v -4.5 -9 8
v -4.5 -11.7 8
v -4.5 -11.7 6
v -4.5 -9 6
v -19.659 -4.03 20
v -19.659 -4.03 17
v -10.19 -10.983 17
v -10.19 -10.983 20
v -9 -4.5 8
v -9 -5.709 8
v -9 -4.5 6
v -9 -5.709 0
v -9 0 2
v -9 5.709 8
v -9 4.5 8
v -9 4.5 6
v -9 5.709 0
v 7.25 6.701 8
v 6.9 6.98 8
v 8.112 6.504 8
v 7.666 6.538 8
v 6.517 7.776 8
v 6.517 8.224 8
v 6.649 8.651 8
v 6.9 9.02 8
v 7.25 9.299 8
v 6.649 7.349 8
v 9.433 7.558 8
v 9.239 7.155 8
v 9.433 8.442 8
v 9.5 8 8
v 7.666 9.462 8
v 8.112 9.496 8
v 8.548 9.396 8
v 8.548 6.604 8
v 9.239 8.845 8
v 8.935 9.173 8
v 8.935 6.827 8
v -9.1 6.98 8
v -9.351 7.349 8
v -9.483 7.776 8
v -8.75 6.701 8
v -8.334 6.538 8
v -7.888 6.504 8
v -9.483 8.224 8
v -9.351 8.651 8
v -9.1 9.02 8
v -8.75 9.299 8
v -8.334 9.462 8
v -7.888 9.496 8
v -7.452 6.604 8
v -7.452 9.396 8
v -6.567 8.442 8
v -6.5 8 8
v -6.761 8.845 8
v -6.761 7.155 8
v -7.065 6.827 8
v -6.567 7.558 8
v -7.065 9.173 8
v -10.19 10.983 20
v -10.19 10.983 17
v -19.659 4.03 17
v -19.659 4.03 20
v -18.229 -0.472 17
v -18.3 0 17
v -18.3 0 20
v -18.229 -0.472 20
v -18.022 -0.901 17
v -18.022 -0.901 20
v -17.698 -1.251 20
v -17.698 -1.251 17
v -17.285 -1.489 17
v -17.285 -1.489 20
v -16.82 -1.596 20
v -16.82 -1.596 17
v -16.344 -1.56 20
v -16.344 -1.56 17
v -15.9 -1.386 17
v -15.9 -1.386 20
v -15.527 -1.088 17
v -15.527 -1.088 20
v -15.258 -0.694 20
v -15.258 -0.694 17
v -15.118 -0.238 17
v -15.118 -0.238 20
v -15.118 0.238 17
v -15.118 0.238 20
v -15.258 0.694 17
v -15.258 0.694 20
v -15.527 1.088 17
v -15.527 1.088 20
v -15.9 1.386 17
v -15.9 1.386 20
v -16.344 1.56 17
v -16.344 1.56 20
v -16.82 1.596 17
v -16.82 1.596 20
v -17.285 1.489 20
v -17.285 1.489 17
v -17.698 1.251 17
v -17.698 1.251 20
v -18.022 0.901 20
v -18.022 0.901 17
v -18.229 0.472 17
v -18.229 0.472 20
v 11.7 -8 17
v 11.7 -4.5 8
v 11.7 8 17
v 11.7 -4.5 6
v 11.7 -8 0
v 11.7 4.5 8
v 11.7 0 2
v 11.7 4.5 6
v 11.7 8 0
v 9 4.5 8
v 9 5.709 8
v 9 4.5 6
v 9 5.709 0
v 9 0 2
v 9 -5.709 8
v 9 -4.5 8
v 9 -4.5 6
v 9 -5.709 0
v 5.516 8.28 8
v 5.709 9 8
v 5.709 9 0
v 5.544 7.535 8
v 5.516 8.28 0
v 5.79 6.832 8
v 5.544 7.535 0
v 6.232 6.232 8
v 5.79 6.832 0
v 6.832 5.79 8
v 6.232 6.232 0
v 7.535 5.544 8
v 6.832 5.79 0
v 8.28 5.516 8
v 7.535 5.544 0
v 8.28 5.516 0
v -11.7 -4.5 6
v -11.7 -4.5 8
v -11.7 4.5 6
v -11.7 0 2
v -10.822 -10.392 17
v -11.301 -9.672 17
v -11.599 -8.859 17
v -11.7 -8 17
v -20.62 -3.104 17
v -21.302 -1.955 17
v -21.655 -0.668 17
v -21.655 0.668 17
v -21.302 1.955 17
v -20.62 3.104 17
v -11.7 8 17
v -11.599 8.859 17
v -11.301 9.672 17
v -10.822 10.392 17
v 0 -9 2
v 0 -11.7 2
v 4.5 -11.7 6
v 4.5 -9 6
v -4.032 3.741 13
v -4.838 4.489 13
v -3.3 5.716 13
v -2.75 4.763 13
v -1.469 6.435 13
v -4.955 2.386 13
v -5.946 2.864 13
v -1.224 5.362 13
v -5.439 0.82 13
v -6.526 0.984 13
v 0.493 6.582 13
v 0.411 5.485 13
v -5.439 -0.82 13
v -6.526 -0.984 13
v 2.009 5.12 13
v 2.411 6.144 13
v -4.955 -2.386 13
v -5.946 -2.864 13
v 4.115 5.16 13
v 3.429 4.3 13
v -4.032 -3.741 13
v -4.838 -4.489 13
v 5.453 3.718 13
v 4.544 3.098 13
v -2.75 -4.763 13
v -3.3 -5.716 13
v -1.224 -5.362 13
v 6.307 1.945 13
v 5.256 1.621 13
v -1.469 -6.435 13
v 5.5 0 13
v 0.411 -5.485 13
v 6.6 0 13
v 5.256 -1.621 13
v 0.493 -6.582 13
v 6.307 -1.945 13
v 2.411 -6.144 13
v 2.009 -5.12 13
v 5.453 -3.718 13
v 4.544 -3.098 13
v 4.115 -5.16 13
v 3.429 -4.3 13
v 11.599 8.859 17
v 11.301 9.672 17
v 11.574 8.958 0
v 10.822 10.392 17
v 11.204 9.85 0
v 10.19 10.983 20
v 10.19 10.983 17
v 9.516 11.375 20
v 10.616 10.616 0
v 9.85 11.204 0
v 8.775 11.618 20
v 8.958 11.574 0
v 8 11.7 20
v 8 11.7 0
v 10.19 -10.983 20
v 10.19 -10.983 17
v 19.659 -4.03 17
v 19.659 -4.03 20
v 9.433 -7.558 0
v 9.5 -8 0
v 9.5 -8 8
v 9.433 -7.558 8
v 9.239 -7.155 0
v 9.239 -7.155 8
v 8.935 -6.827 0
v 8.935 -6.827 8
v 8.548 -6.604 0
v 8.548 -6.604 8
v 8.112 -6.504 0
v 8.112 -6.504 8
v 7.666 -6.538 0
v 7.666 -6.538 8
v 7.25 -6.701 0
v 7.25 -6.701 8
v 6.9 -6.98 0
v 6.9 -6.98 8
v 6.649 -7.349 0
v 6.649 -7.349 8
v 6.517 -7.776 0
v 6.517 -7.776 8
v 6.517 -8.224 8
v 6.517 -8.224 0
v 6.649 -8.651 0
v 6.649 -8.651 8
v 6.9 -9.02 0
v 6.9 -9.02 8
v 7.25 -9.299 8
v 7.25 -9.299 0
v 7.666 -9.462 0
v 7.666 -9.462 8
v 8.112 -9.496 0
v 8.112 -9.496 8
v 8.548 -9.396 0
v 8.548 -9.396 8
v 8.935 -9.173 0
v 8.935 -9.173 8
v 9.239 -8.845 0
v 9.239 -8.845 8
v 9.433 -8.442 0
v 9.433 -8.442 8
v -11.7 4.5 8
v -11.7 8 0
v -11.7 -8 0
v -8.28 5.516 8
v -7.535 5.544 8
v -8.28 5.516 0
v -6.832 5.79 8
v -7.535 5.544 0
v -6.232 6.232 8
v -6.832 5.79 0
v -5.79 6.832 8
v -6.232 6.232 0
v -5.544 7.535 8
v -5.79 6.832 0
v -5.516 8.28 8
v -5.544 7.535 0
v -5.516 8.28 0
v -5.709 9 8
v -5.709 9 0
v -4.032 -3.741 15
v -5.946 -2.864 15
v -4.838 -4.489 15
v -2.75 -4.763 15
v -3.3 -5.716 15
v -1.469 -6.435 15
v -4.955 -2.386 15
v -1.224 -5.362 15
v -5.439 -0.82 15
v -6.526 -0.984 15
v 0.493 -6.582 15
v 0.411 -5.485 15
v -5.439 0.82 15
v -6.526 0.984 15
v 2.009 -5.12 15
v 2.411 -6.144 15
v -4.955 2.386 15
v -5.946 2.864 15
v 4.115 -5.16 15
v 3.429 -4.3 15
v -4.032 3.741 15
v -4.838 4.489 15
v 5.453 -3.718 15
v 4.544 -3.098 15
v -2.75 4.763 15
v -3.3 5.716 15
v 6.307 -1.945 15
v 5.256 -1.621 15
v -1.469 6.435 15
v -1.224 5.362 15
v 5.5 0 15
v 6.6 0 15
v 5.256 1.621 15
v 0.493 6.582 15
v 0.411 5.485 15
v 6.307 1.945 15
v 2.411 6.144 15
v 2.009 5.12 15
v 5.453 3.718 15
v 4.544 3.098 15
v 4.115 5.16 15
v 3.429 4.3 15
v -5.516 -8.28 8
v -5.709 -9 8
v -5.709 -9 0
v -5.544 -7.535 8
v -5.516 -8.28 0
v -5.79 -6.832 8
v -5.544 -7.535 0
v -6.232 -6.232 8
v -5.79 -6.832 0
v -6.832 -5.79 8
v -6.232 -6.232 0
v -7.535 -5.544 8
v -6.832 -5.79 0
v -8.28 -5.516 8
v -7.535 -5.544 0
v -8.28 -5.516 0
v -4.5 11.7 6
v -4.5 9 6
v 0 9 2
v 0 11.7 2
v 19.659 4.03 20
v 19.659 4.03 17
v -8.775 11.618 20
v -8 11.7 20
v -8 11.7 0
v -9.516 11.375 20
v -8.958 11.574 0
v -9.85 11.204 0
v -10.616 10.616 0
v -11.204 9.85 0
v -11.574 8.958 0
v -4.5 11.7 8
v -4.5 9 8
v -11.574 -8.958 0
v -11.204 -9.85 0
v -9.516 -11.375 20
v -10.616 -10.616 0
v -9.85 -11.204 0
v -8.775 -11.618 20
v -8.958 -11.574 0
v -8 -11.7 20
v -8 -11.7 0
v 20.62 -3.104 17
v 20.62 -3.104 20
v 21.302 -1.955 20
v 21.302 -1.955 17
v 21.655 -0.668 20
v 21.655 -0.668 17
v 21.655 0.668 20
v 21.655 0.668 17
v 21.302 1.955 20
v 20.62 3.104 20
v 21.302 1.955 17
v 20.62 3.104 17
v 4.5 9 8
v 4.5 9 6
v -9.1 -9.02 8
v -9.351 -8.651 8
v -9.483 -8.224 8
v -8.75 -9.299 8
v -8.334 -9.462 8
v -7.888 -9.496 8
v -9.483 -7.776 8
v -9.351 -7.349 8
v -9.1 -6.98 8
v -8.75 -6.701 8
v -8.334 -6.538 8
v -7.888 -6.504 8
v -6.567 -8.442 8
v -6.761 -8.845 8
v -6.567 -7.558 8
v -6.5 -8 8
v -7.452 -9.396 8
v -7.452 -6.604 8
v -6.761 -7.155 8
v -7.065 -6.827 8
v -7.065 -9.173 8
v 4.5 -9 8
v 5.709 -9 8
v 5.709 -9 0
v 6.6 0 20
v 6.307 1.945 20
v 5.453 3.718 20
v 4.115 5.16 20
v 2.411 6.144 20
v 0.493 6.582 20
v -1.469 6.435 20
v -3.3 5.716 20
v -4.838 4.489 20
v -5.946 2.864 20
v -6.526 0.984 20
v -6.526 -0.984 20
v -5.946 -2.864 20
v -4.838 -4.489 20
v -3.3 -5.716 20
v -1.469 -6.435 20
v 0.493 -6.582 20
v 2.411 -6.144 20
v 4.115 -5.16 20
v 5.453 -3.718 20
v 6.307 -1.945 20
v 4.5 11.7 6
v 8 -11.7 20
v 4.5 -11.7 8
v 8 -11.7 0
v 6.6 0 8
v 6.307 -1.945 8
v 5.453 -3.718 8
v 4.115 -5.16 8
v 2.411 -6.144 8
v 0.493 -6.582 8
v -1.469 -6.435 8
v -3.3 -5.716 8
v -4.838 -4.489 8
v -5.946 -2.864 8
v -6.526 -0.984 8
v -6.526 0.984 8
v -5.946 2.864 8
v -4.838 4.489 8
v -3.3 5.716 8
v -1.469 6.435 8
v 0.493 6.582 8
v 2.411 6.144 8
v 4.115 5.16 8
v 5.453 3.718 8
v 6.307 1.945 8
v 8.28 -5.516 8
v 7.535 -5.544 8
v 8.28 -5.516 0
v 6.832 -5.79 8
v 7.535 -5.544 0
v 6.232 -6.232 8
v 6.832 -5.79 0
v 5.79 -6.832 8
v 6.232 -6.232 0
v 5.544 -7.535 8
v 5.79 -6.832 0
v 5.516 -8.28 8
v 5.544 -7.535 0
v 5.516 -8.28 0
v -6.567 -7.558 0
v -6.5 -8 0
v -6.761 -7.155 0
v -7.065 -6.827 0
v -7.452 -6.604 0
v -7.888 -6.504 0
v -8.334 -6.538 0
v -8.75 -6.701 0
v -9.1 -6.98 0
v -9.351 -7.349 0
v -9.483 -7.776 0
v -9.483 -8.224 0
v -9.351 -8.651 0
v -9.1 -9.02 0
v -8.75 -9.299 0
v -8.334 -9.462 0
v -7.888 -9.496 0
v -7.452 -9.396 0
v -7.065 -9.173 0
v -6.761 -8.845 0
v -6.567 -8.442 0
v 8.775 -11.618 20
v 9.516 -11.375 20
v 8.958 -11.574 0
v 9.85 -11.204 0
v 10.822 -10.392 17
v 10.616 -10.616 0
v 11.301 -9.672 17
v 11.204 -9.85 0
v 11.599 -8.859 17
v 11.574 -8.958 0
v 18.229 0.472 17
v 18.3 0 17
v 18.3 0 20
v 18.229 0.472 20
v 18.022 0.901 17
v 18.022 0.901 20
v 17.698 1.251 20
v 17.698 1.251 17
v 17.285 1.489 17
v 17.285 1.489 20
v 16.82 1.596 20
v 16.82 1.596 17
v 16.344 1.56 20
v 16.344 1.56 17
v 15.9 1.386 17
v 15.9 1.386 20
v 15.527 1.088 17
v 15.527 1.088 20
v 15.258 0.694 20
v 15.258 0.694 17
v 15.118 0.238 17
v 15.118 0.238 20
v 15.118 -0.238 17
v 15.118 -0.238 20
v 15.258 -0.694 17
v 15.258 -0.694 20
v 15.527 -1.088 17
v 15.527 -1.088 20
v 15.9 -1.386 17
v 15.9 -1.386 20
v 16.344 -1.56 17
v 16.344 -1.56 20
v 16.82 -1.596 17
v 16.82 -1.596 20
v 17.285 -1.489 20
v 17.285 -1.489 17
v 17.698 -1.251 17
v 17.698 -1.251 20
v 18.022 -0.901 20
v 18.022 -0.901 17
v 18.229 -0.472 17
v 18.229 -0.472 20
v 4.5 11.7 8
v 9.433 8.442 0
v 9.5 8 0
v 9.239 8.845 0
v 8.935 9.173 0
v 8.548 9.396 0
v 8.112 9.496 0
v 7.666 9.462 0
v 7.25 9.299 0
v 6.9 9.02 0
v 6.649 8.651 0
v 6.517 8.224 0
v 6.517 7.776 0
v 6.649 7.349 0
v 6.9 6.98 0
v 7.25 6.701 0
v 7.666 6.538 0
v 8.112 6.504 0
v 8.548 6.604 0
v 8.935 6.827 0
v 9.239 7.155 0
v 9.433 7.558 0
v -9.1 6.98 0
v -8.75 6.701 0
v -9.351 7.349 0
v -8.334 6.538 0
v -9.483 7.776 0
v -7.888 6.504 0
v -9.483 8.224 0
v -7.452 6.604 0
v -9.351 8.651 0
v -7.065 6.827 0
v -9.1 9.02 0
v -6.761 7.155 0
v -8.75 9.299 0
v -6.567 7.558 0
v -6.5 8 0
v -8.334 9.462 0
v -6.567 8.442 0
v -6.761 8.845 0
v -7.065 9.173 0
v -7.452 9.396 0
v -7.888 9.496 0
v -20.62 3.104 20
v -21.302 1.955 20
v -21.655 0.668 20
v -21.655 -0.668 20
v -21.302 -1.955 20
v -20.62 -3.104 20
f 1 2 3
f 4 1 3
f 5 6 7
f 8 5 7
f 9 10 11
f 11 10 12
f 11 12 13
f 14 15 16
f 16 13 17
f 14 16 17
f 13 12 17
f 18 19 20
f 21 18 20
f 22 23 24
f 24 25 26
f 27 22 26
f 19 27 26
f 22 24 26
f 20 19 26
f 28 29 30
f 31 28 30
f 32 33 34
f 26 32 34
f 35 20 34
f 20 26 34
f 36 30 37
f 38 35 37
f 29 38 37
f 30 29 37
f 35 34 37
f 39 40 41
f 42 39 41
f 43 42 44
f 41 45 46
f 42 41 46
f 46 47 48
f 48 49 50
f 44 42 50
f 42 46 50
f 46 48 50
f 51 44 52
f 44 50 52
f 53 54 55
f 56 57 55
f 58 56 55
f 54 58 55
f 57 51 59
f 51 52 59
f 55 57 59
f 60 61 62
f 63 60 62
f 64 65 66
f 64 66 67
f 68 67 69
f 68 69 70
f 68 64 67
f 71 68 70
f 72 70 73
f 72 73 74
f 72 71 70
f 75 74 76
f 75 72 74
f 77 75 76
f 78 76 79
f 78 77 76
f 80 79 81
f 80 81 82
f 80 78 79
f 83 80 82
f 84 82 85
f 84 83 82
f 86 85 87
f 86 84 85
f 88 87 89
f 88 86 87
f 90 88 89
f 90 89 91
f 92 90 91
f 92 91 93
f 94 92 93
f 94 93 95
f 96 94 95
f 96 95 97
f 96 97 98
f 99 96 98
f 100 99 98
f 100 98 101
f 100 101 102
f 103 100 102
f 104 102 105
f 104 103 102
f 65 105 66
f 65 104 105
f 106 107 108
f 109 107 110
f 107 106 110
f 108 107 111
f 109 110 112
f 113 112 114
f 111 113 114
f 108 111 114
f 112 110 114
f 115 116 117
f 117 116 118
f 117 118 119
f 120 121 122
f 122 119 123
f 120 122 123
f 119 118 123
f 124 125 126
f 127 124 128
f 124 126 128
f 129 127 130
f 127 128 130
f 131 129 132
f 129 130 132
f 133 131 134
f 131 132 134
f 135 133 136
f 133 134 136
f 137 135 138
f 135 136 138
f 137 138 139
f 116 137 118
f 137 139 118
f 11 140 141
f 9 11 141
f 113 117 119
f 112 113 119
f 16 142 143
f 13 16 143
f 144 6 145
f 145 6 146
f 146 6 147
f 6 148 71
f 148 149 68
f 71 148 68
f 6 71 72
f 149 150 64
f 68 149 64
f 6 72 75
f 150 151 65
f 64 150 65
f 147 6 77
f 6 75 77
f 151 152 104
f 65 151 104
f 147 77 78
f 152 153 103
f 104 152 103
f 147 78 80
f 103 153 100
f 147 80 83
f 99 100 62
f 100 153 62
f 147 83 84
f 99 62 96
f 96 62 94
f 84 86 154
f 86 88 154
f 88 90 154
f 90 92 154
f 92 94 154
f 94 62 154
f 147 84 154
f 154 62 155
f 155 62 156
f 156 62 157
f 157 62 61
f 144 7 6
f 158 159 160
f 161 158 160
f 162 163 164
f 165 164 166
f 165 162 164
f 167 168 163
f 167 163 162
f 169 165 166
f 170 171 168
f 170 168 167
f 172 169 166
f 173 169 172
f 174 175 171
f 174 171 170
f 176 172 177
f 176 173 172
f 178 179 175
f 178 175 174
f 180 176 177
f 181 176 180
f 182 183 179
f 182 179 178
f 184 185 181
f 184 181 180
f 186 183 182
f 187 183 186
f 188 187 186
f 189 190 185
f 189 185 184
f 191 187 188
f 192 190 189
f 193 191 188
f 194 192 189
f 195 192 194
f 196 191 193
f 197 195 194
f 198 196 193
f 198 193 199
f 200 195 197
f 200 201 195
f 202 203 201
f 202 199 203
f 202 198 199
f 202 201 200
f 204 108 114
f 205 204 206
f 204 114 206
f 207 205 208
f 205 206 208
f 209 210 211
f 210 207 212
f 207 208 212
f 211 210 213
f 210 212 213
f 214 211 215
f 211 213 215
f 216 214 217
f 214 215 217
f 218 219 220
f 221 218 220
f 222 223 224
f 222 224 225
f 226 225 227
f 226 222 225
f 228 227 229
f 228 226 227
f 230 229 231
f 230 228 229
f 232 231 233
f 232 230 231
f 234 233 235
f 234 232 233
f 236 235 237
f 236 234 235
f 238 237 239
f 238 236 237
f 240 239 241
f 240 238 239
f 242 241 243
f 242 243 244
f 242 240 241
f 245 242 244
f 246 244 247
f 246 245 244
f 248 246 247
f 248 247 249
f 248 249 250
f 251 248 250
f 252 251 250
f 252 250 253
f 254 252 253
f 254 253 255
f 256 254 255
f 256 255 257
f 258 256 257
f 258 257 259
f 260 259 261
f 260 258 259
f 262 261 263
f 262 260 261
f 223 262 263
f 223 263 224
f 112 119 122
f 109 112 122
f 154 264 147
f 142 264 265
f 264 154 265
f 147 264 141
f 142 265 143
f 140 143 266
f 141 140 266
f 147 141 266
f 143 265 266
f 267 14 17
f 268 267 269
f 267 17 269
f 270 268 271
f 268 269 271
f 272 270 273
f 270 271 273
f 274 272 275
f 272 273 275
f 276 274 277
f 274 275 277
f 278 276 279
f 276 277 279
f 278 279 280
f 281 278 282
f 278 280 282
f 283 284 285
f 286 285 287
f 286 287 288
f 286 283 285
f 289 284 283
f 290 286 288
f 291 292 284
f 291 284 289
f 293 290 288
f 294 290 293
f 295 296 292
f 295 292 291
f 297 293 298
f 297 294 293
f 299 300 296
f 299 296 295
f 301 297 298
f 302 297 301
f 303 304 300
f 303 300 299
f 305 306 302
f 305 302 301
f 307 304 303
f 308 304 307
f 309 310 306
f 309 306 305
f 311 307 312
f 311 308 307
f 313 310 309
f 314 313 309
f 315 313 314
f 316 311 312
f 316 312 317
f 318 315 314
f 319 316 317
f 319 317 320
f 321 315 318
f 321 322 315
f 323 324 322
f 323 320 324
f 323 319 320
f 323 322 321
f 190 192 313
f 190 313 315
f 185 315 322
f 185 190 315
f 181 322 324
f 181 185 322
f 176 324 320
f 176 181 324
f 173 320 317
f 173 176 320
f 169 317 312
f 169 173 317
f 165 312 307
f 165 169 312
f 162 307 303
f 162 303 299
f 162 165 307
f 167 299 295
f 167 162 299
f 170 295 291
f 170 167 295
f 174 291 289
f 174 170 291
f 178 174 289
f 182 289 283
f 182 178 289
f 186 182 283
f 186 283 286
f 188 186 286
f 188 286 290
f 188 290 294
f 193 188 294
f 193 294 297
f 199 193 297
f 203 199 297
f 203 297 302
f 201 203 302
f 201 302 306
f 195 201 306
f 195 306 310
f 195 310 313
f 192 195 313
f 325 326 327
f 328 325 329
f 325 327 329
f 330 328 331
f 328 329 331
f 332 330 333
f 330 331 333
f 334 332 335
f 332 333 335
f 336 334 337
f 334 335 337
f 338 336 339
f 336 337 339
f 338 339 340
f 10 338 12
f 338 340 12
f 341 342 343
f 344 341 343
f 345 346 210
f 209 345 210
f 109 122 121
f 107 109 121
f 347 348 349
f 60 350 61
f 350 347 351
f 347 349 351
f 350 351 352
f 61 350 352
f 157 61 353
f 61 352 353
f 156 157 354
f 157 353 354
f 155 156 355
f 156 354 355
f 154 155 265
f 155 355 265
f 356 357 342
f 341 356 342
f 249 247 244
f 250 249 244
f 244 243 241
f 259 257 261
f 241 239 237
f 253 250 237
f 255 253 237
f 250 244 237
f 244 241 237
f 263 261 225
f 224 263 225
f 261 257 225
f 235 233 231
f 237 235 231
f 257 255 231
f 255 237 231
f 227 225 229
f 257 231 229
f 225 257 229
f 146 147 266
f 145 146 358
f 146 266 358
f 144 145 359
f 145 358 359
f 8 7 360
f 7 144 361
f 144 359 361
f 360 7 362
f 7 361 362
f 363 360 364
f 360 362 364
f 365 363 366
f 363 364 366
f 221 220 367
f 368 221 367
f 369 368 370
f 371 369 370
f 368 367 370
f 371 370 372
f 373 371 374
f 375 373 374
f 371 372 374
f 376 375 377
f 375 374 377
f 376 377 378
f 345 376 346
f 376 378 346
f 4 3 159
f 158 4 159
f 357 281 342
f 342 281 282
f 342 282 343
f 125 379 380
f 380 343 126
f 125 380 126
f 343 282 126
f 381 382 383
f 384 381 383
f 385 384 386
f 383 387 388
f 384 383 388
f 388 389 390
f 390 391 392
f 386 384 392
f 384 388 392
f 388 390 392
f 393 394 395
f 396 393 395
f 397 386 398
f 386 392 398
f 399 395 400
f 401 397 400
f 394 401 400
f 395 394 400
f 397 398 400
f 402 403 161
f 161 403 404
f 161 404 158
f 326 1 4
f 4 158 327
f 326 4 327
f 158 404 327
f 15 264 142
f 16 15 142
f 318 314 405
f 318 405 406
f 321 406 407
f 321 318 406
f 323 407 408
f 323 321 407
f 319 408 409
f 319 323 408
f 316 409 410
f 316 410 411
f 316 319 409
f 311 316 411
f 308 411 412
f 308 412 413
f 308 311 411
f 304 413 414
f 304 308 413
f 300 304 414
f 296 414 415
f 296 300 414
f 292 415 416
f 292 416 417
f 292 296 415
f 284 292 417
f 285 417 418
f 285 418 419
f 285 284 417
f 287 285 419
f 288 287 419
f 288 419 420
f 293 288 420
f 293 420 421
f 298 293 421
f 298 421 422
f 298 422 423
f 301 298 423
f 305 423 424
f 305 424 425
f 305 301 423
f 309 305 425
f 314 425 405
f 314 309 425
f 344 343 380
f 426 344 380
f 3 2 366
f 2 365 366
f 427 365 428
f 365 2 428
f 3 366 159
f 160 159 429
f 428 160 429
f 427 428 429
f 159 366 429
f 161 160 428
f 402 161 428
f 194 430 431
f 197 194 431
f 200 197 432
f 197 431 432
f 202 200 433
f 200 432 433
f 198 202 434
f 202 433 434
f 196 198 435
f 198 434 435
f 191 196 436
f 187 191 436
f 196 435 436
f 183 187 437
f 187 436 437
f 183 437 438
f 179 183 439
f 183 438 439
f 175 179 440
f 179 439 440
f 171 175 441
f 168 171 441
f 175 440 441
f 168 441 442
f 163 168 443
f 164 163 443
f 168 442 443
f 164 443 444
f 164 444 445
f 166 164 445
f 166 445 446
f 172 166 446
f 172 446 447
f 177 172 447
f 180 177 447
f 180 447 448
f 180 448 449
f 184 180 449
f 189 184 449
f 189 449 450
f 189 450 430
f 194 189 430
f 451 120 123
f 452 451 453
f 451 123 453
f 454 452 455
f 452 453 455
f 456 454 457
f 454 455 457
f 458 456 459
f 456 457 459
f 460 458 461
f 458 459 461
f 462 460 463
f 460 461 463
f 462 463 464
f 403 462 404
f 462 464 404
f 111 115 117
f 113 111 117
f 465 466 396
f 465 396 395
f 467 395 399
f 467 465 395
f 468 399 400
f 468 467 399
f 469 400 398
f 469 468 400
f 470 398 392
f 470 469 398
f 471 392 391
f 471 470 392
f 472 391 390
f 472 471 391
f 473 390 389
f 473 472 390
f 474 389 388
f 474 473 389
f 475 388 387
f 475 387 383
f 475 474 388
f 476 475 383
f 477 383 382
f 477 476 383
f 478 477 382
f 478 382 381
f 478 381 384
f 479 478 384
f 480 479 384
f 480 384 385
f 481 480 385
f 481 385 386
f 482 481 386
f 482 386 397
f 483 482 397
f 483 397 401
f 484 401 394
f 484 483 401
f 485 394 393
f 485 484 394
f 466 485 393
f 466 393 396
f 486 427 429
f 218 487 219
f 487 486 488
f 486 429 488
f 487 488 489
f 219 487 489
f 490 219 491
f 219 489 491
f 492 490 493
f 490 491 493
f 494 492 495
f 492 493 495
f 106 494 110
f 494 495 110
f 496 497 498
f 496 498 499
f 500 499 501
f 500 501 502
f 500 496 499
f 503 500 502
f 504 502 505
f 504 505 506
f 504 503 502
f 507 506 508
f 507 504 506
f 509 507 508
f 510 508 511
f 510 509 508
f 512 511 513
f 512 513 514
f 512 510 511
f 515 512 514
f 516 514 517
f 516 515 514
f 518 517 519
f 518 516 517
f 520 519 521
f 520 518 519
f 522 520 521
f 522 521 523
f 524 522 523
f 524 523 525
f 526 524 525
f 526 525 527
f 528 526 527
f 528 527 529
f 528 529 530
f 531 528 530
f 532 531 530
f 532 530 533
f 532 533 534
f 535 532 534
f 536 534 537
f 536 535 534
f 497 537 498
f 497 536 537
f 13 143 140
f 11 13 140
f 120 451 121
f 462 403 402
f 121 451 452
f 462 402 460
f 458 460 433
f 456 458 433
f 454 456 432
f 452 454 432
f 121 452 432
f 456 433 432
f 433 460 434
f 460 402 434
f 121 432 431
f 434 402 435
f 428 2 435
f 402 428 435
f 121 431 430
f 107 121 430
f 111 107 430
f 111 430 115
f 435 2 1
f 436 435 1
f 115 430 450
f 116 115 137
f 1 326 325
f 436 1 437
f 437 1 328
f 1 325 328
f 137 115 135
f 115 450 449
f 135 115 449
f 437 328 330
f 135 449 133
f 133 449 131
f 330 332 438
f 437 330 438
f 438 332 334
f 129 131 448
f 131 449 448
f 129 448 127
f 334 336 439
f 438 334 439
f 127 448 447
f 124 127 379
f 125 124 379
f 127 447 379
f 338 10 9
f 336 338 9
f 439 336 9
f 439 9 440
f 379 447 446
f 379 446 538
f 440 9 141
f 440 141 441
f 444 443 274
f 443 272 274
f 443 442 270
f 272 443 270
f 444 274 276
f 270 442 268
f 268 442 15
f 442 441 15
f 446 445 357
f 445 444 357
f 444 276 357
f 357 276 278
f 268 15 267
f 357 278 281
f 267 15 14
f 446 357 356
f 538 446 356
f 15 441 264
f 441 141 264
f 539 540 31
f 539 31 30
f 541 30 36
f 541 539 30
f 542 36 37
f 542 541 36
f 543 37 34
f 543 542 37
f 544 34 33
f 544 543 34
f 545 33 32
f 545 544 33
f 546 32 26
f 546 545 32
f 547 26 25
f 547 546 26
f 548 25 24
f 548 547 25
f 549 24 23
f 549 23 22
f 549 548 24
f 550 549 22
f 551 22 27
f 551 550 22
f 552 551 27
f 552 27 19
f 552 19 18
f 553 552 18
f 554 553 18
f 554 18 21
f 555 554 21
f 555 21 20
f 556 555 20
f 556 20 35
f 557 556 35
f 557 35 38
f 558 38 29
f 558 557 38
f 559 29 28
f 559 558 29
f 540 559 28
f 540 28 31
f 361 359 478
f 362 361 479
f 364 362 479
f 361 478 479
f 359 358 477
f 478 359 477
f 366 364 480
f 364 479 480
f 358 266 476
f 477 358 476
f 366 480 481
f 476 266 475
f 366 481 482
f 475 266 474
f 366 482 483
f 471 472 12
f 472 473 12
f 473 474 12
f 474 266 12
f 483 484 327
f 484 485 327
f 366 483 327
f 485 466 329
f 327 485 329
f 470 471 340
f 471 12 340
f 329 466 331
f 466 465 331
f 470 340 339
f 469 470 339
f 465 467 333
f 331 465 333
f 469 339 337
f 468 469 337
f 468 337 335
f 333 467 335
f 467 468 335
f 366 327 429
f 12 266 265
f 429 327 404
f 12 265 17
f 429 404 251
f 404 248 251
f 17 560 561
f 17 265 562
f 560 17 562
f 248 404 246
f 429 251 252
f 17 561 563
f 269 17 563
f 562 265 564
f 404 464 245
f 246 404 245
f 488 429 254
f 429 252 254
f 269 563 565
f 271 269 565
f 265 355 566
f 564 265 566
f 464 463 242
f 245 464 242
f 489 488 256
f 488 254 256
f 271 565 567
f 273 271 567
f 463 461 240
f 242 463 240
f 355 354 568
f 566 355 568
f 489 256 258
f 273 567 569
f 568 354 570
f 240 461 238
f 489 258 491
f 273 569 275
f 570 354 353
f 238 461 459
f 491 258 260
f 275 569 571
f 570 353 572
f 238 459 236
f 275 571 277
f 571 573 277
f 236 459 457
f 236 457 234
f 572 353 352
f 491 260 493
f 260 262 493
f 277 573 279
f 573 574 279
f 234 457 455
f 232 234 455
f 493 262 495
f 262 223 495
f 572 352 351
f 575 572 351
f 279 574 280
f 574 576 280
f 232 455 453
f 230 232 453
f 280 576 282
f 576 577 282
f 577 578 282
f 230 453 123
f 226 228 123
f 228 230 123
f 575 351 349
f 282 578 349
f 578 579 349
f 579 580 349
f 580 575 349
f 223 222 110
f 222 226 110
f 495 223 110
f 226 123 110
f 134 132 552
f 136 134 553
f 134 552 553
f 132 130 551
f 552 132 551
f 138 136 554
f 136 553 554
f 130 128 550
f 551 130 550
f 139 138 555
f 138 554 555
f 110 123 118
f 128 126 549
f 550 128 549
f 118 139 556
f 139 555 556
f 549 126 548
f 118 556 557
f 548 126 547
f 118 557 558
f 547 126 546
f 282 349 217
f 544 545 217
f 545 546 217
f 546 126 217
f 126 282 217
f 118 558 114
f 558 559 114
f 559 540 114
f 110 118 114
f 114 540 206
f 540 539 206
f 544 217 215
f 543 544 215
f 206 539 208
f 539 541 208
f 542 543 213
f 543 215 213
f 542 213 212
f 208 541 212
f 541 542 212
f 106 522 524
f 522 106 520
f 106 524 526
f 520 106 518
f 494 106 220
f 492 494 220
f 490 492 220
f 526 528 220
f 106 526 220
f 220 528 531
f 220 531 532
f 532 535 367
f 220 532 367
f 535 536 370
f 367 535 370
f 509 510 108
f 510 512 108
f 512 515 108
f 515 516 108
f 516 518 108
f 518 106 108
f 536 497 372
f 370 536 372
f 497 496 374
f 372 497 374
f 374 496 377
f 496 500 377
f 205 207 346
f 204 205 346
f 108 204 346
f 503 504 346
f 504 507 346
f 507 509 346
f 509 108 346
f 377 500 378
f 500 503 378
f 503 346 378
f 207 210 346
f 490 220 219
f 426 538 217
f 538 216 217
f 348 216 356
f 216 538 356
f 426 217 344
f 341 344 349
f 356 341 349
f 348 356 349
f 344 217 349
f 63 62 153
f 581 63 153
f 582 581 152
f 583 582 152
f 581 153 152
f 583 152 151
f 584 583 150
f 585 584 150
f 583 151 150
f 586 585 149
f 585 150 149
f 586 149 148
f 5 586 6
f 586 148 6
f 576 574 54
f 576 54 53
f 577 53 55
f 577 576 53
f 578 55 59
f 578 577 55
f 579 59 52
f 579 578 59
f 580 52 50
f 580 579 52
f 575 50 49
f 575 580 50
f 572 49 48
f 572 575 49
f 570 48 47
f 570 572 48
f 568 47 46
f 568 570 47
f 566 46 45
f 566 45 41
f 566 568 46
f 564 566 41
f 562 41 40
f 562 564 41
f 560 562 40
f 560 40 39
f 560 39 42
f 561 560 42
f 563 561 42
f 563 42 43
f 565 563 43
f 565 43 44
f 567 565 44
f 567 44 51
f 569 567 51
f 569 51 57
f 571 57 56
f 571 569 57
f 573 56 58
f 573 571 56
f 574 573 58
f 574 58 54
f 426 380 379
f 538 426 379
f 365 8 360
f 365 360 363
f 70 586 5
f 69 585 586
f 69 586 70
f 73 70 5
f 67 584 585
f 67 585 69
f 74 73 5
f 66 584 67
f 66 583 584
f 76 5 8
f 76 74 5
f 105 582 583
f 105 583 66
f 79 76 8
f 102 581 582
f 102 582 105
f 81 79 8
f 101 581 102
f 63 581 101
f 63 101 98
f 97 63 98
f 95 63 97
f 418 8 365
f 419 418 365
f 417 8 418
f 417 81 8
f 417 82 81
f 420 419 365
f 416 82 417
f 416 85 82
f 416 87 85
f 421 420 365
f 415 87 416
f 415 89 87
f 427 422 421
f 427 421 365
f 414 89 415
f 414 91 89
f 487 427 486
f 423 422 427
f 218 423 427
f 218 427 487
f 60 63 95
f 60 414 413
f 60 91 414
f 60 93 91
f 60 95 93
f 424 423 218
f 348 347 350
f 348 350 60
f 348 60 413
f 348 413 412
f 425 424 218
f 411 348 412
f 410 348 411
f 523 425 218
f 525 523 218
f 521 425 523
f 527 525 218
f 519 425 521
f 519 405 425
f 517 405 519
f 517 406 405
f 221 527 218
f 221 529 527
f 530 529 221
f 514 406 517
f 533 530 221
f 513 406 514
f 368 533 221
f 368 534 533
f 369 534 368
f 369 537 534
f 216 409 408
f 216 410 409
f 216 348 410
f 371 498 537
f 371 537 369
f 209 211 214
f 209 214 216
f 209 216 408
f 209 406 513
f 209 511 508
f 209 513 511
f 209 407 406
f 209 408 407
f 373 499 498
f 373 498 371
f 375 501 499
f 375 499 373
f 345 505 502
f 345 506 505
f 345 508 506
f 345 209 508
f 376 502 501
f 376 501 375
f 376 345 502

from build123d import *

# Parameters (mm, degrees)
SKETCH1_R               = 1.5
BOSS_EXTRUDE1_DEPTH     = 8
SKETCH2_R               = 5.5
BOSS_EXTRUDE2_DEPTH     = 7
SKETCH3_R               = 6.6
BOSS_EXTRUDE3_DEPTH     = 5
CUT_EXTRUDE2_DEPTH      = 33.930988446
SKETCH6_R               = 6.6
CUT_EXTRUDE3_DEPTH      = 5
BOSS_EXTRUDE4_START     = -3
SKETCH7_R               = 1.6
BOSS_EXTRUDE4_DEPTH     = 3
CIRPATTERN1_COUNT       = 2
CIRPATTERN1_ANGLE       = 90
CUT_EXTRUDE_THIN1_REACH = 33.746


with BuildPart() as part:
    # Sketch1 → Boss-Extrude1 (new body)
    with BuildSketch(Plane.XY):
        with BuildLine():
            ThreePointArc((-11.7, -8), (-10.61629509, -10.61629509), (-8, -11.7))
            Line((-8, -11.7), (8, -11.7))
            ThreePointArc((8, -11.7), (10.61629509, -10.61629509), (11.7, -8))
            Line((11.7, -8), (11.7, 8))
            ThreePointArc((11.7, 8), (10.61629509, 10.61629509), (8, 11.7))
            Line((8, 11.7), (-8, 11.7))
            ThreePointArc((-8, 11.7), (-10.61629509, 10.61629509), (-11.7, 8))
            Line((-11.7, 8), (-11.7, -8))
        make_face()
        with Locations((-8, 8)):
            Circle(SKETCH1_R, mode=Mode.SUBTRACT)
        with BuildLine():
            ThreePointArc((-8, 4.5), (-5.525126266, 5.525126266), (-4.5, 8))
            Line((-4.5, 8), (4.5, 8))
            ThreePointArc((4.5, 8), (5.525126266, 5.525126266), (8, 4.5))
            Line((8, 4.5), (8, -4.5))
            ThreePointArc((8, -4.5), (5.525126266, -5.525126266), (4.5, -8))
            Line((4.5, -8), (-4.5, -8))
            ThreePointArc((-4.5, -8), (-5.525126266, -5.525126266), (-8, -4.5))
            Line((-8, -4.5), (-8, 4.5))
        make_face(mode=Mode.SUBTRACT)
        with Locations((8, -8)):
            Circle(SKETCH1_R, mode=Mode.SUBTRACT)
        with Locations((-8, -8)):
            Circle(SKETCH1_R, mode=Mode.SUBTRACT)
        with Locations((8, 8)):
            Circle(SKETCH1_R, mode=Mode.SUBTRACT)
    extrude(amount=BOSS_EXTRUDE1_DEPTH)

    # Sketch2 → Boss-Extrude2 (add)
    with BuildSketch(Plane.XY.offset(8)):
        with BuildLine():
            Line((8, 11.7), (-8, 11.7))
            ThreePointArc((-8, 11.7), (-10.61629509, 10.61629509), (-11.7, 8))
            Line((-11.7, 8), (-11.7, -8))
            ThreePointArc((-11.7, -8), (-10.61629509, -10.61629509), (-8, -11.7))
            Line((-8, -11.7), (8, -11.7))
            ThreePointArc((8, -11.7), (10.61629509, -10.61629509), (11.7, -8))
            Line((11.7, -8), (11.7, 8))
            ThreePointArc((11.7, 8), (10.61629509, 10.61629509), (8, 11.7))
        make_face()
        Circle(SKETCH2_R, mode=Mode.SUBTRACT)
    extrude(amount=BOSS_EXTRUDE2_DEPTH)

    # Sketch3 → Boss-Extrude3 (add)
    with BuildSketch(Plane.XY.offset(15)):
        with BuildLine():
            Line((8, 11.7), (-8, 11.7))
            ThreePointArc((-8, 11.7), (-10.61629509, 10.61629509), (-11.7, 8))
            Line((-11.7, 8), (-11.7, -8))
            ThreePointArc((-11.7, -8), (-10.61629509, -10.61629509), (-8, -11.7))
            Line((-8, -11.7), (8, -11.7))
            ThreePointArc((8, -11.7), (10.61629509, -10.61629509), (11.7, -8))
            Line((11.7, -8), (11.7, 8))
            ThreePointArc((11.7, 8), (10.61629509, 10.61629509), (8, 11.7))
        make_face()
        Circle(SKETCH3_R, mode=Mode.SUBTRACT)
    extrude(amount=BOSS_EXTRUDE3_DEPTH)

    # Sketch5 → Cut-Extrude2 (cut, through all)
    with BuildSketch(Plane.XZ.offset(11.7)):
        Polygon((-4.5, 6), (0, 2), (4.5, 6), (4.5, 8), (-4.5, 8), align=None)
    cut_extrude2 = extrude(amount=-CUT_EXTRUDE2_DEPTH, mode=Mode.SUBTRACT)

    # Sketch6 → Cut-Extrude3 (cut)
    with BuildSketch(Plane(origin=(0, 0, 8), x_dir=(-1, 0, 0), z_dir=(0, 0, -1))):
        with Locations(Location((0, 0, 0), (0, 0, 180))):
            Circle(SKETCH6_R)
    extrude(amount=-CUT_EXTRUDE3_DEPTH, mode=Mode.SUBTRACT)

    # Sketch7 → Boss-Extrude4 (add)
    # profile 1 of 2: a face of its own
    with BuildSketch(Plane.XY.offset(20).offset(BOSS_EXTRUDE4_START)):
        with BuildLine():
            Line((19.659006407, 4.030419467), (10.189664741, 10.982510406))
            ThreePointArc((10.189664741, 10.982510406), (11.300890754, 9.671562212), (11.7, 8))
            Line((11.7, 8), (11.7, -8))
            ThreePointArc((11.7, -8), (11.300890754, -9.671562212), (10.189664741, -10.982510406))
            Line((10.189664741, -10.982510406), (19.659006407, -4.030419467))
            ThreePointArc((19.659006407, -4.030419467), (21.7, 0), (19.659006407, 4.030419467))
        make_face()
        with Locations((16.7, 0)):
            Circle(SKETCH7_R, mode=Mode.SUBTRACT)
    # profile 2 of 2: a face of its own
    with BuildSketch(Plane.XY.offset(20).offset(BOSS_EXTRUDE4_START)):
        with BuildLine():
            Line((-11.7, -8), (-11.7, 8))
            ThreePointArc((-11.7, 8), (-11.300890754, 9.671562212), (-10.189664741, 10.982510406))
            Line((-10.189664741, 10.982510406), (-19.659006407, 4.030419467))
            ThreePointArc((-19.659006407, 4.030419467), (-21.7, 0), (-19.659006407, -4.030419467))
            Line((-19.659006407, -4.030419467), (-10.189664741, -10.982510406))
            ThreePointArc((-10.189664741, -10.982510406), (-11.300890754, -9.671562212), (-11.7, -8))
        make_face()
        with Locations(Location((-16.7, 0, 0), (0, 0, 180))):
            Circle(SKETCH7_R, mode=Mode.SUBTRACT)
    extrude(amount=BOSS_EXTRUDE4_DEPTH)

    # CirPattern1: Cut-Extrude2 ×2 about axis
    cirpattern1_axis = Axis((0, 0, 8), (0, 0, -1))
    for i in range(1, CIRPATTERN1_COUNT):
        add(cut_extrude2.rotate(cirpattern1_axis, i * CIRPATTERN1_ANGLE / (CIRPATTERN1_COUNT - 1)), mode=Mode.SUBTRACT)

    # Cut-Extrude-Thin1: up to this face of the body (flat: up to its plane)
    cut_extrude_thin1_end = Plane(part.part.faces().sort_by_distance((-11.369074026, 0, 8))[0])
    # Sketch8 → Cut-Extrude-Thin1 (cut, up to the picked face)
    with BuildSketch(Plane(origin=(0, 0, 0), x_dir=(-1, 0, 0), z_dir=(0, 0, -1)), mode=Mode.PRIVATE) as cut_extrude_thin1_sk1:
        with BuildLine():
            Line((5.708712153, 9), (-5.708712153, 9))
            ThreePointArc((-5.708712153, 9), (-6.232233047, 6.232233047), (-9, 5.708712153))
            Line((-9, 5.708712153), (-9, -5.708712153))
            ThreePointArc((-9, -5.708712153), (-6.232233047, -6.232233047), (-5.708712153, -9))
            Line((-5.708712153, -9), (5.708712153, -9))
            ThreePointArc((5.708712153, -9), (6.232233047, -6.232233047), (9, -5.708712153))
            Line((9, -5.708712153), (9, 5.708712153))
            ThreePointArc((9, 5.708712153), (6.232233047, 6.232233047), (5.708712153, 9))
        make_face()
        with BuildLine():
            Line((4.5, 8), (-4.5, 8))
            ThreePointArc((-4.5, 8), (-5.525126266, 5.525126266), (-8, 4.5))
            Line((-8, 4.5), (-8, -4.5))
            ThreePointArc((-8, -4.5), (-5.525126266, -5.525126266), (-4.5, -8))
            Line((-4.5, -8), (4.5, -8))
            ThreePointArc((4.5, -8), (5.525126266, -5.525126266), (8, -4.5))
            Line((8, -4.5), (8, 4.5))
            ThreePointArc((8, 4.5), (5.525126266, 5.525126266), (4.5, 8))
        make_face(mode=Mode.SUBTRACT)
    cut_extrude_thin1_tool1 = split(extrude(cut_extrude_thin1_sk1.sketch, amount=-CUT_EXTRUDE_THIN1_REACH, mode=Mode.PRIVATE), bisect_by=cut_extrude_thin1_end, keep=Keep.BOTH, mode=Mode.PRIVATE)
    add(cut_extrude_thin1_tool1.solids().sort_by(Axis((-6.052233, 6.052233, 0), (0, 0, 1)))[0], mode=Mode.SUBTRACT)


solid = part.part
